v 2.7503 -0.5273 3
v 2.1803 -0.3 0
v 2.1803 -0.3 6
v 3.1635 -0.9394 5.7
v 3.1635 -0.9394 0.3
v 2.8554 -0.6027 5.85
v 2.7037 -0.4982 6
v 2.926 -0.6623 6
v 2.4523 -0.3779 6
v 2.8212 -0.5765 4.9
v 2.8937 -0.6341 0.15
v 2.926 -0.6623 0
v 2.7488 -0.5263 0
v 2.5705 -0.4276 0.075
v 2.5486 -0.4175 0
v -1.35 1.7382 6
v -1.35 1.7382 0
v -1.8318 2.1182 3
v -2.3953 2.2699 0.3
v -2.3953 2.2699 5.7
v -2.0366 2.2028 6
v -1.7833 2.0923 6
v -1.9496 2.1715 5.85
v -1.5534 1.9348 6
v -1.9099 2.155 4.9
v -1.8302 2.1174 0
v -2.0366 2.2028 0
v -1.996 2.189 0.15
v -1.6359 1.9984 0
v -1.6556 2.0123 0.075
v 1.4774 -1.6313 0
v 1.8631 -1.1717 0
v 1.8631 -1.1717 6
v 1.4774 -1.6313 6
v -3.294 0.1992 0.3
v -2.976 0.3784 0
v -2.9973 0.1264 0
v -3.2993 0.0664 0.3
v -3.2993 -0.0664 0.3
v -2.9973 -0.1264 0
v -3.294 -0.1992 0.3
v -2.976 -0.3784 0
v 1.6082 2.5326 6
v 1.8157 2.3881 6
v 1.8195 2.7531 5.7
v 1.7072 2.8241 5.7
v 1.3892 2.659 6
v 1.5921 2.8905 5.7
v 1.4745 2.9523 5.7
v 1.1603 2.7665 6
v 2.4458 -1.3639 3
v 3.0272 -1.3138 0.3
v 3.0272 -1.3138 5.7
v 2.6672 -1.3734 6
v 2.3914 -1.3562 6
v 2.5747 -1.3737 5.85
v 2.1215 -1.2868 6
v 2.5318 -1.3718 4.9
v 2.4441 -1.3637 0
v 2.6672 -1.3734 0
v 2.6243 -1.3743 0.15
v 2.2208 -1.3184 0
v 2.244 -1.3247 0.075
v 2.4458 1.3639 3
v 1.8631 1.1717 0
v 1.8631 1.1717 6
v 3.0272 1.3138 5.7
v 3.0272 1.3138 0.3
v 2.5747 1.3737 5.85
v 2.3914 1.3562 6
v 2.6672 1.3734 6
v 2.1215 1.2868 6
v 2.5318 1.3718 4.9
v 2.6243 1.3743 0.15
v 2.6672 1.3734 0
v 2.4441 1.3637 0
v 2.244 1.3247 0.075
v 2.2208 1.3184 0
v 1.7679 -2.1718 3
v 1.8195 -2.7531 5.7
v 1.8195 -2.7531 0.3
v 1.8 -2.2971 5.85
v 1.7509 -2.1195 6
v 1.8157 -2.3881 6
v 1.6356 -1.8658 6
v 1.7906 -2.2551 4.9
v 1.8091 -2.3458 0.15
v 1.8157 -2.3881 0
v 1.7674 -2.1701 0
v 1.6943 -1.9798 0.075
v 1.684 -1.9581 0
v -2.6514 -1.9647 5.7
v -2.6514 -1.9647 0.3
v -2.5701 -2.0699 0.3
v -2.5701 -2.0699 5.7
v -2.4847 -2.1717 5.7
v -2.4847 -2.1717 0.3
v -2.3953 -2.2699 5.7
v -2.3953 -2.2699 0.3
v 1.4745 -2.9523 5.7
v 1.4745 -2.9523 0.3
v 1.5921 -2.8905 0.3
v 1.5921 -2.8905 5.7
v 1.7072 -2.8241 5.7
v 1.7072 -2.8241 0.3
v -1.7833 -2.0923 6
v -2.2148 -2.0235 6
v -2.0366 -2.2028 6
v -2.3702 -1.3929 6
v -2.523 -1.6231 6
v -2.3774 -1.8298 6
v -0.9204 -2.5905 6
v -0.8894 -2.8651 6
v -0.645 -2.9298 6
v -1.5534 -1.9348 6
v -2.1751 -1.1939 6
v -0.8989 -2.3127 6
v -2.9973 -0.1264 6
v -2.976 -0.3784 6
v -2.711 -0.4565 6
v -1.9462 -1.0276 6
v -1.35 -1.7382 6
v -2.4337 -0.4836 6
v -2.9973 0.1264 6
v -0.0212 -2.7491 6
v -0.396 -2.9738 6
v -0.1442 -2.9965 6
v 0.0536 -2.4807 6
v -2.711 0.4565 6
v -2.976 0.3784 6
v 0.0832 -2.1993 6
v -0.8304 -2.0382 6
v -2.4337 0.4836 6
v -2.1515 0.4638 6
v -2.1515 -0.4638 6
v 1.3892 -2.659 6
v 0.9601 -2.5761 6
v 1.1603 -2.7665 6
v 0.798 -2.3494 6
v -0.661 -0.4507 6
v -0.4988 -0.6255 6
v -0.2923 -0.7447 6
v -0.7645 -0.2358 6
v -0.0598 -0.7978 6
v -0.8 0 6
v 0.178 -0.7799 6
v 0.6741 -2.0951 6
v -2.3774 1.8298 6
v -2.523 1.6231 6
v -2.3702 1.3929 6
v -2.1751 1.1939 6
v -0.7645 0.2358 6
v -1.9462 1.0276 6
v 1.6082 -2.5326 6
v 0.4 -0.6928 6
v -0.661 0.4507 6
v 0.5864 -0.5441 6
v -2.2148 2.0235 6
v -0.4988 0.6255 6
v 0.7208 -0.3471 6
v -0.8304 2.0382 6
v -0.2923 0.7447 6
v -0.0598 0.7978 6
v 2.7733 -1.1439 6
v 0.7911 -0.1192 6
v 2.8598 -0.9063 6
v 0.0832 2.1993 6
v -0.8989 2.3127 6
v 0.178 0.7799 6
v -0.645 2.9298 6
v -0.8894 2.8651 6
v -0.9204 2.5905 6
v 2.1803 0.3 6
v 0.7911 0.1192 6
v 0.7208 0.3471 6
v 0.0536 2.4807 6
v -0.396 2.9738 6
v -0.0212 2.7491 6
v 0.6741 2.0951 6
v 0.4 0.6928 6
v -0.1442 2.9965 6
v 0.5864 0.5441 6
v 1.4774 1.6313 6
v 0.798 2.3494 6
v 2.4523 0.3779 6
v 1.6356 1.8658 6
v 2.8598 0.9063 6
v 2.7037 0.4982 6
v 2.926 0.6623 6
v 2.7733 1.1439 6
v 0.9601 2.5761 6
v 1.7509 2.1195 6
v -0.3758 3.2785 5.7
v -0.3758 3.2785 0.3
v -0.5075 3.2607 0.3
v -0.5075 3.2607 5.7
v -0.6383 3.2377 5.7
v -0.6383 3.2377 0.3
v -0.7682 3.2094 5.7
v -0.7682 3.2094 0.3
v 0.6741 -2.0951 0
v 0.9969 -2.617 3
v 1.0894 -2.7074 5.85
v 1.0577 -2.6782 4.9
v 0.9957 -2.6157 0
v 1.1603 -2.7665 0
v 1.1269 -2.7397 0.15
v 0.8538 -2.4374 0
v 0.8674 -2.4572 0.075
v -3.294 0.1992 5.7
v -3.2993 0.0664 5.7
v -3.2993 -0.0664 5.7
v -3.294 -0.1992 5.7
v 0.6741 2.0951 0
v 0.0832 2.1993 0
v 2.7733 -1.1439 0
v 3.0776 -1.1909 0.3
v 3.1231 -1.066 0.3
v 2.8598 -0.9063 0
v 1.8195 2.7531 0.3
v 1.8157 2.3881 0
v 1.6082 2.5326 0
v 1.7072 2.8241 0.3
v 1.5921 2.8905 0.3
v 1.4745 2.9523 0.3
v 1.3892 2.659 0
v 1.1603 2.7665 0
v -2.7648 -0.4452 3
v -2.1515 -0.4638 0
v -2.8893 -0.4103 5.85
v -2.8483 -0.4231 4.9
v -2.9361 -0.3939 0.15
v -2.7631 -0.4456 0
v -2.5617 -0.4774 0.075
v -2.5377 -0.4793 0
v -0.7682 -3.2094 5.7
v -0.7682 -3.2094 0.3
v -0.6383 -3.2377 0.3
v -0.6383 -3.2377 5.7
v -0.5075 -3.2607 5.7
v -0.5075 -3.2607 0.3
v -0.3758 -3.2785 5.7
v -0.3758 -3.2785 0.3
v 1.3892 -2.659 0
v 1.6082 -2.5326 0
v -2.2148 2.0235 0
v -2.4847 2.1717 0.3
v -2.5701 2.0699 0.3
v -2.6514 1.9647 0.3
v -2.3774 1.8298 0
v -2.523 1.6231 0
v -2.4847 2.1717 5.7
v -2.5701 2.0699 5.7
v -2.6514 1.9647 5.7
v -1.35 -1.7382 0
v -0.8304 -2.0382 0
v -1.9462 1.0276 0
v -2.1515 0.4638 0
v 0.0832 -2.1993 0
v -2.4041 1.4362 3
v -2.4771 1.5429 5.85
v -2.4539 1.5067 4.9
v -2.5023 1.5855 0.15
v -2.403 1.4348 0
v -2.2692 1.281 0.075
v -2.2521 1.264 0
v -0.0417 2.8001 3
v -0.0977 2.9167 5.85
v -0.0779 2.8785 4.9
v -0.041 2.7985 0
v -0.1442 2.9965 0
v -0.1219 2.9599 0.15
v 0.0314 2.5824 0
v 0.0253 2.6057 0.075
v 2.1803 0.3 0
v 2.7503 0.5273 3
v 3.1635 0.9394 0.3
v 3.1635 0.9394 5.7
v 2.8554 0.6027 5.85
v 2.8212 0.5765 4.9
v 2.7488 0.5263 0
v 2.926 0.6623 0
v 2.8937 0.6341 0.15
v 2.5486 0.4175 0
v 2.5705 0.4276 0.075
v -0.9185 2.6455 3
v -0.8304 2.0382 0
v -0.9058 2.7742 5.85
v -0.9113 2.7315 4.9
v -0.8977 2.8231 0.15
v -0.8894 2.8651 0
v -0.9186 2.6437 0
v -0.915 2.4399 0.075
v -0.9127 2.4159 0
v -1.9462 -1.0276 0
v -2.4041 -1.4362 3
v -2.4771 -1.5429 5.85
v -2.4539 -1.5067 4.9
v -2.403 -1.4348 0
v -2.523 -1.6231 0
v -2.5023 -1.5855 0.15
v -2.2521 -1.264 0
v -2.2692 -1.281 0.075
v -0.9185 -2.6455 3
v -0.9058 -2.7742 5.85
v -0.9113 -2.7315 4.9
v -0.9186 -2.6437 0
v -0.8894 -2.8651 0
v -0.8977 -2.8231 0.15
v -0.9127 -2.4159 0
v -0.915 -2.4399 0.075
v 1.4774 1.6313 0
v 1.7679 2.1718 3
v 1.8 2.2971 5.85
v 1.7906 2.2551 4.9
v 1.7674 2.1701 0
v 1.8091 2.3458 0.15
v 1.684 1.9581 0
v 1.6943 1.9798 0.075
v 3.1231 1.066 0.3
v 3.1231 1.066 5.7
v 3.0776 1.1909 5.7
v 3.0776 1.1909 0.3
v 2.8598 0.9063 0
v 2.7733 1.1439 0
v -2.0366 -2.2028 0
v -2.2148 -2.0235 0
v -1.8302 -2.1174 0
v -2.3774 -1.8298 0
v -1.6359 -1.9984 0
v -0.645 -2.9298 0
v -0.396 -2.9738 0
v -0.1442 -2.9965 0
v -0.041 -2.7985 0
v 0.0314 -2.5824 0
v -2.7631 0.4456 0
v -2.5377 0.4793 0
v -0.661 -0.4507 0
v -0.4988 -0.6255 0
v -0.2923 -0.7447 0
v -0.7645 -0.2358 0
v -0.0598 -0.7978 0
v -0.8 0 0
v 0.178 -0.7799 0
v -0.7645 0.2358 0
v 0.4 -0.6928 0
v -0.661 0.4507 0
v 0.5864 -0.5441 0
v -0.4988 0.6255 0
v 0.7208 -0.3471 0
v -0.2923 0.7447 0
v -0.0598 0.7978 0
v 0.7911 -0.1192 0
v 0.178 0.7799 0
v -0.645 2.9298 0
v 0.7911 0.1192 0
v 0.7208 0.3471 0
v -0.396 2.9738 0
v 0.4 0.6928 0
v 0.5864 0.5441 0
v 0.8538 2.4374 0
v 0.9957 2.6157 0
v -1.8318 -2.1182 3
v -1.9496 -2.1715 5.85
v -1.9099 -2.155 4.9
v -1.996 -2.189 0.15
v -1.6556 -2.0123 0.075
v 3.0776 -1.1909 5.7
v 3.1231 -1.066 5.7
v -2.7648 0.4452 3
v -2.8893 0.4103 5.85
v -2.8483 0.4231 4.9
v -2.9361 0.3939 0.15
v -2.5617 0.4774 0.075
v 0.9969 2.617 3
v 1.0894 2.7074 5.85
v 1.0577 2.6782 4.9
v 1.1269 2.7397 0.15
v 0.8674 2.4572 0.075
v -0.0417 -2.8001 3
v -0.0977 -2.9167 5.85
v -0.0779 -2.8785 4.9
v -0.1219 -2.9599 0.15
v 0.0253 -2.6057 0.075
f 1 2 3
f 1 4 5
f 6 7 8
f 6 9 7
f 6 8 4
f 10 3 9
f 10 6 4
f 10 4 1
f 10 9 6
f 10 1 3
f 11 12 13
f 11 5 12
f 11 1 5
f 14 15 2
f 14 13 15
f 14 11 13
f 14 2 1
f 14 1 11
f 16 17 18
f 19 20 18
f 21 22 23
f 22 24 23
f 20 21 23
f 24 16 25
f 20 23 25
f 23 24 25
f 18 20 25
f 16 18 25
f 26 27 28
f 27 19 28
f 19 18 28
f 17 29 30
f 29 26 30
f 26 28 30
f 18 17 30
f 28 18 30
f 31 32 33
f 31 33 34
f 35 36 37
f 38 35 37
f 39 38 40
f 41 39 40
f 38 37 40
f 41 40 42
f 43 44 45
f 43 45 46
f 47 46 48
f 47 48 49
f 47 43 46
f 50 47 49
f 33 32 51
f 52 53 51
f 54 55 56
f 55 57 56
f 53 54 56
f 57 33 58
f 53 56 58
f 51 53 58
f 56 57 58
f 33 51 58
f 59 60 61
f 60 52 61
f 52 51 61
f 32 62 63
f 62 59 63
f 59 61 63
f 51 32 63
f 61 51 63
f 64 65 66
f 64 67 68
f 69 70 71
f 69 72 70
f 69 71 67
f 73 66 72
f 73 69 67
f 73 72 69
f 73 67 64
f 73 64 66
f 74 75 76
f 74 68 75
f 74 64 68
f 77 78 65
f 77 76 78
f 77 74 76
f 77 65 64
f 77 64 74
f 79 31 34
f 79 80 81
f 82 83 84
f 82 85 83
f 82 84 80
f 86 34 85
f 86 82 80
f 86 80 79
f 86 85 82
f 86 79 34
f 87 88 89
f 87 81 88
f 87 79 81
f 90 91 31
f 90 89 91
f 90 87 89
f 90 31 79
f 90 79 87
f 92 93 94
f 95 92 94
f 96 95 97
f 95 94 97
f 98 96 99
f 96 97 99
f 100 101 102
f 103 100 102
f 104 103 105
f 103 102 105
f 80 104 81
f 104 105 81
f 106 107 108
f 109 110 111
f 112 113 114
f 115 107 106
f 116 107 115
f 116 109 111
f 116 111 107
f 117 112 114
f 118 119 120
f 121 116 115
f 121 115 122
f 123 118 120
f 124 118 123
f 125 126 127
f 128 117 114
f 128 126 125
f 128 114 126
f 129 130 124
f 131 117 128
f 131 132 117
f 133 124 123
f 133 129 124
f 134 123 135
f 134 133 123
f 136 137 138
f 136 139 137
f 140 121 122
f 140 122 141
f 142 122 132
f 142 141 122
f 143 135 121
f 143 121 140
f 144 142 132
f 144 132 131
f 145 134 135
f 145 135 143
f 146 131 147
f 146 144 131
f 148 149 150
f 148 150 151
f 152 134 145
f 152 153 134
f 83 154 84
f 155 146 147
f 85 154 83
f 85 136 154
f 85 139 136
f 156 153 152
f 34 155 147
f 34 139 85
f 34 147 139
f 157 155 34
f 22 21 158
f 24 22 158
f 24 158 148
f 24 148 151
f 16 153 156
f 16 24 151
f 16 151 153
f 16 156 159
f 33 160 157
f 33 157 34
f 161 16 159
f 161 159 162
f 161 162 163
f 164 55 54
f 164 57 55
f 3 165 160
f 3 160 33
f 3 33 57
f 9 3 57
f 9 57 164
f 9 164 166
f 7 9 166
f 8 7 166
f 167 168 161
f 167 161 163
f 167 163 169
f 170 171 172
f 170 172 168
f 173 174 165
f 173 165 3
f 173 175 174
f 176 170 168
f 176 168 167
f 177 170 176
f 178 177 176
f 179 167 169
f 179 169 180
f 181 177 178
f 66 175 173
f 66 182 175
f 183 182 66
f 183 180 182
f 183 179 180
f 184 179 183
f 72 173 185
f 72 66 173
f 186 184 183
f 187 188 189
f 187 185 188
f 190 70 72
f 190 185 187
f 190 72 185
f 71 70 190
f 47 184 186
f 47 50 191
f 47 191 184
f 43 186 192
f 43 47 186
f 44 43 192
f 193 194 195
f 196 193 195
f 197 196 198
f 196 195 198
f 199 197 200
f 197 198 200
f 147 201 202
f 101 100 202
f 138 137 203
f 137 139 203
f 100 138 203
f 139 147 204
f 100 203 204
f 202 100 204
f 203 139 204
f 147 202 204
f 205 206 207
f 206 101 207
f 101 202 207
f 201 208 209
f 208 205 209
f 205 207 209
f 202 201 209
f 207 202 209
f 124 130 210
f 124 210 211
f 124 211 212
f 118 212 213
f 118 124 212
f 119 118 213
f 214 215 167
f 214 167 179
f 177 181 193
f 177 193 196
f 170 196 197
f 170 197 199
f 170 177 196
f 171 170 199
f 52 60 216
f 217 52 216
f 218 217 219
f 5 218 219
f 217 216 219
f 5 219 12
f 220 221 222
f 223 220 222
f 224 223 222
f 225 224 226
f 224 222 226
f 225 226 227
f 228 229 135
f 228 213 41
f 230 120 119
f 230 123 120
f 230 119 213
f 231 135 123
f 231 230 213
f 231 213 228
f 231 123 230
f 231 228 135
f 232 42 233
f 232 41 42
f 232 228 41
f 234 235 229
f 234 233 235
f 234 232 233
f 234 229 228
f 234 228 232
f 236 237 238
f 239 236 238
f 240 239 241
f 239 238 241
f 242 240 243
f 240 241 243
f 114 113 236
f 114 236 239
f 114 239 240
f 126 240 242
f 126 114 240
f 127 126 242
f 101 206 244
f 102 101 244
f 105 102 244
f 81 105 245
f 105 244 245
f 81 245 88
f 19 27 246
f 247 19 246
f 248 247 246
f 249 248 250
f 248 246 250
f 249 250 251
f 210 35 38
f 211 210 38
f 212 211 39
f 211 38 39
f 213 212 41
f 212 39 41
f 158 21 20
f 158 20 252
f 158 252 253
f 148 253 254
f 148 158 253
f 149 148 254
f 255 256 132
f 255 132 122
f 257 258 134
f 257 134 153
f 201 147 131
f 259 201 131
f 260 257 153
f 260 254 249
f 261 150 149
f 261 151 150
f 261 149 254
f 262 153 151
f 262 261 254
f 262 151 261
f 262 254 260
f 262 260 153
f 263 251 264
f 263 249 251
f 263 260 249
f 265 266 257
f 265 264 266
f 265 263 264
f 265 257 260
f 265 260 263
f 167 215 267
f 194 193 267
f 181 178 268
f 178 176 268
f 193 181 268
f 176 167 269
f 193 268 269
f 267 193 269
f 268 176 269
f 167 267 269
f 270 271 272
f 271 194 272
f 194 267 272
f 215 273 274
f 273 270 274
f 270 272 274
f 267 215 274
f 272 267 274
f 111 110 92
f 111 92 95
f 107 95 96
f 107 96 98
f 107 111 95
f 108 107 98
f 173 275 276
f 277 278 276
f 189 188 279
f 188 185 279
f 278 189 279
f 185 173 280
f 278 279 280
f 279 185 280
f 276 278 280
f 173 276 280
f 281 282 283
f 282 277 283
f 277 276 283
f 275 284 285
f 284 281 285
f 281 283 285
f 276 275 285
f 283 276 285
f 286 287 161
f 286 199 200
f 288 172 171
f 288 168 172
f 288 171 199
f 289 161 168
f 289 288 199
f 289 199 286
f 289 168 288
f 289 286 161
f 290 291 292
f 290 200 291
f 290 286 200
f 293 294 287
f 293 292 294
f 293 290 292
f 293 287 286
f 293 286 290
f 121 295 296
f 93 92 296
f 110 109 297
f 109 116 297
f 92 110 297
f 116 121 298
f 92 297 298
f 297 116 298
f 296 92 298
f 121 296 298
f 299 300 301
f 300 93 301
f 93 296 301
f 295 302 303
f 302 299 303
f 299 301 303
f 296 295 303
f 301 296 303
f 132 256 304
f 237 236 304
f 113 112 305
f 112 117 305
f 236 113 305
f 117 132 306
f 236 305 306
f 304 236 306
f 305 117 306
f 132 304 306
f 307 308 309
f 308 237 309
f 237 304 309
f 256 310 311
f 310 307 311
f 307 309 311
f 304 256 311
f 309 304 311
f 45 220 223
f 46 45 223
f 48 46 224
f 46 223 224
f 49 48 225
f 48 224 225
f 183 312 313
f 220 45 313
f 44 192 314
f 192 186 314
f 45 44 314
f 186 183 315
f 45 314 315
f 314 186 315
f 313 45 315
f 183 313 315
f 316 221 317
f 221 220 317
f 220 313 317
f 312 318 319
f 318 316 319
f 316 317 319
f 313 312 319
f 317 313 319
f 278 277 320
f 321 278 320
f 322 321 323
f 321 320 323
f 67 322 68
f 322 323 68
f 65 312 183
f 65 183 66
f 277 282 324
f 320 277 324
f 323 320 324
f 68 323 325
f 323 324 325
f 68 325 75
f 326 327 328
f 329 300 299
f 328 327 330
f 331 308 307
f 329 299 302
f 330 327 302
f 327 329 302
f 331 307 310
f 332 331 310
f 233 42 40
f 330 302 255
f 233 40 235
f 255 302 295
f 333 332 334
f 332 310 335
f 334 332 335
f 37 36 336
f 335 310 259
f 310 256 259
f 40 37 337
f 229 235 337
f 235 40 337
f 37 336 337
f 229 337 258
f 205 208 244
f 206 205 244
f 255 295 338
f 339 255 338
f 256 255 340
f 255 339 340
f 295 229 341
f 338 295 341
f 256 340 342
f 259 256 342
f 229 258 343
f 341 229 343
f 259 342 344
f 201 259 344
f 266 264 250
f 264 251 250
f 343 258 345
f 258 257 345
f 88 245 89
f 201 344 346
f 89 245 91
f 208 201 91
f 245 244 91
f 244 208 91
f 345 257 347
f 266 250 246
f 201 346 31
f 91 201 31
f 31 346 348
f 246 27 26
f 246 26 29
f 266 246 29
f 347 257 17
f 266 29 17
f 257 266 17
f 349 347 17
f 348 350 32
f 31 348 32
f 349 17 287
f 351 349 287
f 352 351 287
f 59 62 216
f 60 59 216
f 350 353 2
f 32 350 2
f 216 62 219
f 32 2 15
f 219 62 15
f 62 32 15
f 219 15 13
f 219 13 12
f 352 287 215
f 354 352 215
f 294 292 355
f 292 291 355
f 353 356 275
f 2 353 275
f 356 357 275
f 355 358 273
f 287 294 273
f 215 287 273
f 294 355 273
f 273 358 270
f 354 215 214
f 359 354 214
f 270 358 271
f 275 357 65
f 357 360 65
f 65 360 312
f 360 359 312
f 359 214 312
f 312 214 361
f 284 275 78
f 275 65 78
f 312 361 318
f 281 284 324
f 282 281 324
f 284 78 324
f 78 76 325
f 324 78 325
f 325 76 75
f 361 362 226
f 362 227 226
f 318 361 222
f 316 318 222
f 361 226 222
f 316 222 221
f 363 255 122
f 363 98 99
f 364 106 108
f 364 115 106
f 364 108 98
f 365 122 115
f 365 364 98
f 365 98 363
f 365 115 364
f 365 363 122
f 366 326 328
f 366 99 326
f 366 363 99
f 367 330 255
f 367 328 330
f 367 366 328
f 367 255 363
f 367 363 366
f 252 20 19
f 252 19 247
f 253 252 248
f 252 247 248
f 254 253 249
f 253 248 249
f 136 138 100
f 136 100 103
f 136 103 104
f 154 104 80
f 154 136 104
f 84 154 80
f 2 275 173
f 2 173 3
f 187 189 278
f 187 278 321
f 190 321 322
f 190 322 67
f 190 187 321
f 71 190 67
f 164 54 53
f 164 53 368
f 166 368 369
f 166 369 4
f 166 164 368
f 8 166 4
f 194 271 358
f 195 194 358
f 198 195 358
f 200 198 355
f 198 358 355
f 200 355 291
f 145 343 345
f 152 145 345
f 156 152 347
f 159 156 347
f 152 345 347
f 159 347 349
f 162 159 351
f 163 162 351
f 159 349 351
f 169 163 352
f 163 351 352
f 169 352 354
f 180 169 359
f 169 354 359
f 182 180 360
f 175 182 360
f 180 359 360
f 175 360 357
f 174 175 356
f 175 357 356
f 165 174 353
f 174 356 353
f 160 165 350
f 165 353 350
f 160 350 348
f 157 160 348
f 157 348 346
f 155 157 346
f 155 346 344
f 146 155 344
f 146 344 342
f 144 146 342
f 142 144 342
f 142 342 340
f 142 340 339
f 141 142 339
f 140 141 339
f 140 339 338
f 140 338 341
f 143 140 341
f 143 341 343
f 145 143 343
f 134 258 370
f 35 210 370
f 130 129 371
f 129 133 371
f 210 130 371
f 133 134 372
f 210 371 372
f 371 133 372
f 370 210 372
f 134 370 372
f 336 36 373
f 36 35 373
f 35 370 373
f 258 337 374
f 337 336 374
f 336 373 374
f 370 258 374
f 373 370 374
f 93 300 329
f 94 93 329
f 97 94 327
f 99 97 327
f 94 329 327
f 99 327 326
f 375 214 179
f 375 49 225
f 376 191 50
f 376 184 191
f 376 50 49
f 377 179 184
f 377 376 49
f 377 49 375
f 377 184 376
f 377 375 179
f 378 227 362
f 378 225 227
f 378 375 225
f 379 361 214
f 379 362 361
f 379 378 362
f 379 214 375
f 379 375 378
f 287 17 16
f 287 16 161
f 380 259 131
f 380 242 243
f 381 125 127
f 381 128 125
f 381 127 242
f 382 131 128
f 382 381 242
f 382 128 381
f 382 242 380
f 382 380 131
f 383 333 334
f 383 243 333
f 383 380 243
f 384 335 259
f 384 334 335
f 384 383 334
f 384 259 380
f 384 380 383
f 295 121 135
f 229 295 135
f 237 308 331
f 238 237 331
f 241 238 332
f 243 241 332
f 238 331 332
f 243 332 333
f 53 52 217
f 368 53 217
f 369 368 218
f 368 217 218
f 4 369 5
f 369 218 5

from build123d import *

# Parameters (mm, degrees)
SKETCH_1_R               = 3.3
EXTRUDE_1_DEPTH          = 6
CHAMFER_1_SIZE           = 0.3
CUT_EXTRUDE_1_DEPTH      = 8.601315676
PATTERN_CIRCULAR_1_COUNT = 9
SKETCH_3_R               = 0.8
CUT_EXTRUDE_2_DEPTH      = 8.592018845


with BuildPart() as part:
    # 草图1 → 凸台-拉伸1 (new body)
    with BuildSketch(Plane.XY):
        Circle(SKETCH_1_R)
    extrude(amount=EXTRUDE_1_DEPTH)

    # 倒角1
    chamfer_1_edges = [part.edges().sort_by_distance(p)[0] for p in [
        (-3.3, 0, 6),
        (-3.3, 0, 0),
    ]]
    chamfer(chamfer_1_edges, length=CHAMFER_1_SIZE)

    # 草图2 → 切除-拉伸1 (cut, through all)
    with BuildSketch(Plane(origin=(0, 0, 0), x_dir=(-1, 0, 0), z_dir=(0, 0, -1))):
        with BuildLine():
            Line((-2.18033666, 0.3), (-2.18033666, -0.3))
            add(Edge.make_bspline(
                [(-2.18033666, -0.3), (-3.086972582, -0.488594071), (-3.38033666, -1.4)],
                knots=[0, 0, 0, 1, 1, 1], degree=2))
            Line((-3.38033666, -1.4), (-3.38033666, 1.4))
            add(Edge.make_bspline(
                [(-2.18033666, 0.3), (-3.086972582, 0.488594071), (-3.38033666, 1.4)],
                knots=[0, 0, 0, 1, 1, 1], degree=2))
        make_face()
    cut_extrude_1 = extrude(amount=-CUT_EXTRUDE_1_DEPTH, mode=Mode.SUBTRACT)

    # 阵列(圆周)1: 切除-拉伸1 ×9 about axis
    pattern_circular_1_axis = Axis((0, 0, 0), (0, 0, -1))
    for i in range(1, PATTERN_CIRCULAR_1_COUNT):
        add(cut_extrude_1.rotate(pattern_circular_1_axis, i * 360 / PATTERN_CIRCULAR_1_COUNT), mode=Mode.SUBTRACT)

    # 草图3 → 切除-拉伸2 (cut, through all)
    with BuildSketch(Plane(origin=(0, 0, 0), x_dir=(-1, 0, 0), z_dir=(0, 0, -1))):
        Circle(SKETCH_3_R)
    extrude(amount=-CUT_EXTRUDE_2_DEPTH, mode=Mode.SUBTRACT)


solid = part.part
